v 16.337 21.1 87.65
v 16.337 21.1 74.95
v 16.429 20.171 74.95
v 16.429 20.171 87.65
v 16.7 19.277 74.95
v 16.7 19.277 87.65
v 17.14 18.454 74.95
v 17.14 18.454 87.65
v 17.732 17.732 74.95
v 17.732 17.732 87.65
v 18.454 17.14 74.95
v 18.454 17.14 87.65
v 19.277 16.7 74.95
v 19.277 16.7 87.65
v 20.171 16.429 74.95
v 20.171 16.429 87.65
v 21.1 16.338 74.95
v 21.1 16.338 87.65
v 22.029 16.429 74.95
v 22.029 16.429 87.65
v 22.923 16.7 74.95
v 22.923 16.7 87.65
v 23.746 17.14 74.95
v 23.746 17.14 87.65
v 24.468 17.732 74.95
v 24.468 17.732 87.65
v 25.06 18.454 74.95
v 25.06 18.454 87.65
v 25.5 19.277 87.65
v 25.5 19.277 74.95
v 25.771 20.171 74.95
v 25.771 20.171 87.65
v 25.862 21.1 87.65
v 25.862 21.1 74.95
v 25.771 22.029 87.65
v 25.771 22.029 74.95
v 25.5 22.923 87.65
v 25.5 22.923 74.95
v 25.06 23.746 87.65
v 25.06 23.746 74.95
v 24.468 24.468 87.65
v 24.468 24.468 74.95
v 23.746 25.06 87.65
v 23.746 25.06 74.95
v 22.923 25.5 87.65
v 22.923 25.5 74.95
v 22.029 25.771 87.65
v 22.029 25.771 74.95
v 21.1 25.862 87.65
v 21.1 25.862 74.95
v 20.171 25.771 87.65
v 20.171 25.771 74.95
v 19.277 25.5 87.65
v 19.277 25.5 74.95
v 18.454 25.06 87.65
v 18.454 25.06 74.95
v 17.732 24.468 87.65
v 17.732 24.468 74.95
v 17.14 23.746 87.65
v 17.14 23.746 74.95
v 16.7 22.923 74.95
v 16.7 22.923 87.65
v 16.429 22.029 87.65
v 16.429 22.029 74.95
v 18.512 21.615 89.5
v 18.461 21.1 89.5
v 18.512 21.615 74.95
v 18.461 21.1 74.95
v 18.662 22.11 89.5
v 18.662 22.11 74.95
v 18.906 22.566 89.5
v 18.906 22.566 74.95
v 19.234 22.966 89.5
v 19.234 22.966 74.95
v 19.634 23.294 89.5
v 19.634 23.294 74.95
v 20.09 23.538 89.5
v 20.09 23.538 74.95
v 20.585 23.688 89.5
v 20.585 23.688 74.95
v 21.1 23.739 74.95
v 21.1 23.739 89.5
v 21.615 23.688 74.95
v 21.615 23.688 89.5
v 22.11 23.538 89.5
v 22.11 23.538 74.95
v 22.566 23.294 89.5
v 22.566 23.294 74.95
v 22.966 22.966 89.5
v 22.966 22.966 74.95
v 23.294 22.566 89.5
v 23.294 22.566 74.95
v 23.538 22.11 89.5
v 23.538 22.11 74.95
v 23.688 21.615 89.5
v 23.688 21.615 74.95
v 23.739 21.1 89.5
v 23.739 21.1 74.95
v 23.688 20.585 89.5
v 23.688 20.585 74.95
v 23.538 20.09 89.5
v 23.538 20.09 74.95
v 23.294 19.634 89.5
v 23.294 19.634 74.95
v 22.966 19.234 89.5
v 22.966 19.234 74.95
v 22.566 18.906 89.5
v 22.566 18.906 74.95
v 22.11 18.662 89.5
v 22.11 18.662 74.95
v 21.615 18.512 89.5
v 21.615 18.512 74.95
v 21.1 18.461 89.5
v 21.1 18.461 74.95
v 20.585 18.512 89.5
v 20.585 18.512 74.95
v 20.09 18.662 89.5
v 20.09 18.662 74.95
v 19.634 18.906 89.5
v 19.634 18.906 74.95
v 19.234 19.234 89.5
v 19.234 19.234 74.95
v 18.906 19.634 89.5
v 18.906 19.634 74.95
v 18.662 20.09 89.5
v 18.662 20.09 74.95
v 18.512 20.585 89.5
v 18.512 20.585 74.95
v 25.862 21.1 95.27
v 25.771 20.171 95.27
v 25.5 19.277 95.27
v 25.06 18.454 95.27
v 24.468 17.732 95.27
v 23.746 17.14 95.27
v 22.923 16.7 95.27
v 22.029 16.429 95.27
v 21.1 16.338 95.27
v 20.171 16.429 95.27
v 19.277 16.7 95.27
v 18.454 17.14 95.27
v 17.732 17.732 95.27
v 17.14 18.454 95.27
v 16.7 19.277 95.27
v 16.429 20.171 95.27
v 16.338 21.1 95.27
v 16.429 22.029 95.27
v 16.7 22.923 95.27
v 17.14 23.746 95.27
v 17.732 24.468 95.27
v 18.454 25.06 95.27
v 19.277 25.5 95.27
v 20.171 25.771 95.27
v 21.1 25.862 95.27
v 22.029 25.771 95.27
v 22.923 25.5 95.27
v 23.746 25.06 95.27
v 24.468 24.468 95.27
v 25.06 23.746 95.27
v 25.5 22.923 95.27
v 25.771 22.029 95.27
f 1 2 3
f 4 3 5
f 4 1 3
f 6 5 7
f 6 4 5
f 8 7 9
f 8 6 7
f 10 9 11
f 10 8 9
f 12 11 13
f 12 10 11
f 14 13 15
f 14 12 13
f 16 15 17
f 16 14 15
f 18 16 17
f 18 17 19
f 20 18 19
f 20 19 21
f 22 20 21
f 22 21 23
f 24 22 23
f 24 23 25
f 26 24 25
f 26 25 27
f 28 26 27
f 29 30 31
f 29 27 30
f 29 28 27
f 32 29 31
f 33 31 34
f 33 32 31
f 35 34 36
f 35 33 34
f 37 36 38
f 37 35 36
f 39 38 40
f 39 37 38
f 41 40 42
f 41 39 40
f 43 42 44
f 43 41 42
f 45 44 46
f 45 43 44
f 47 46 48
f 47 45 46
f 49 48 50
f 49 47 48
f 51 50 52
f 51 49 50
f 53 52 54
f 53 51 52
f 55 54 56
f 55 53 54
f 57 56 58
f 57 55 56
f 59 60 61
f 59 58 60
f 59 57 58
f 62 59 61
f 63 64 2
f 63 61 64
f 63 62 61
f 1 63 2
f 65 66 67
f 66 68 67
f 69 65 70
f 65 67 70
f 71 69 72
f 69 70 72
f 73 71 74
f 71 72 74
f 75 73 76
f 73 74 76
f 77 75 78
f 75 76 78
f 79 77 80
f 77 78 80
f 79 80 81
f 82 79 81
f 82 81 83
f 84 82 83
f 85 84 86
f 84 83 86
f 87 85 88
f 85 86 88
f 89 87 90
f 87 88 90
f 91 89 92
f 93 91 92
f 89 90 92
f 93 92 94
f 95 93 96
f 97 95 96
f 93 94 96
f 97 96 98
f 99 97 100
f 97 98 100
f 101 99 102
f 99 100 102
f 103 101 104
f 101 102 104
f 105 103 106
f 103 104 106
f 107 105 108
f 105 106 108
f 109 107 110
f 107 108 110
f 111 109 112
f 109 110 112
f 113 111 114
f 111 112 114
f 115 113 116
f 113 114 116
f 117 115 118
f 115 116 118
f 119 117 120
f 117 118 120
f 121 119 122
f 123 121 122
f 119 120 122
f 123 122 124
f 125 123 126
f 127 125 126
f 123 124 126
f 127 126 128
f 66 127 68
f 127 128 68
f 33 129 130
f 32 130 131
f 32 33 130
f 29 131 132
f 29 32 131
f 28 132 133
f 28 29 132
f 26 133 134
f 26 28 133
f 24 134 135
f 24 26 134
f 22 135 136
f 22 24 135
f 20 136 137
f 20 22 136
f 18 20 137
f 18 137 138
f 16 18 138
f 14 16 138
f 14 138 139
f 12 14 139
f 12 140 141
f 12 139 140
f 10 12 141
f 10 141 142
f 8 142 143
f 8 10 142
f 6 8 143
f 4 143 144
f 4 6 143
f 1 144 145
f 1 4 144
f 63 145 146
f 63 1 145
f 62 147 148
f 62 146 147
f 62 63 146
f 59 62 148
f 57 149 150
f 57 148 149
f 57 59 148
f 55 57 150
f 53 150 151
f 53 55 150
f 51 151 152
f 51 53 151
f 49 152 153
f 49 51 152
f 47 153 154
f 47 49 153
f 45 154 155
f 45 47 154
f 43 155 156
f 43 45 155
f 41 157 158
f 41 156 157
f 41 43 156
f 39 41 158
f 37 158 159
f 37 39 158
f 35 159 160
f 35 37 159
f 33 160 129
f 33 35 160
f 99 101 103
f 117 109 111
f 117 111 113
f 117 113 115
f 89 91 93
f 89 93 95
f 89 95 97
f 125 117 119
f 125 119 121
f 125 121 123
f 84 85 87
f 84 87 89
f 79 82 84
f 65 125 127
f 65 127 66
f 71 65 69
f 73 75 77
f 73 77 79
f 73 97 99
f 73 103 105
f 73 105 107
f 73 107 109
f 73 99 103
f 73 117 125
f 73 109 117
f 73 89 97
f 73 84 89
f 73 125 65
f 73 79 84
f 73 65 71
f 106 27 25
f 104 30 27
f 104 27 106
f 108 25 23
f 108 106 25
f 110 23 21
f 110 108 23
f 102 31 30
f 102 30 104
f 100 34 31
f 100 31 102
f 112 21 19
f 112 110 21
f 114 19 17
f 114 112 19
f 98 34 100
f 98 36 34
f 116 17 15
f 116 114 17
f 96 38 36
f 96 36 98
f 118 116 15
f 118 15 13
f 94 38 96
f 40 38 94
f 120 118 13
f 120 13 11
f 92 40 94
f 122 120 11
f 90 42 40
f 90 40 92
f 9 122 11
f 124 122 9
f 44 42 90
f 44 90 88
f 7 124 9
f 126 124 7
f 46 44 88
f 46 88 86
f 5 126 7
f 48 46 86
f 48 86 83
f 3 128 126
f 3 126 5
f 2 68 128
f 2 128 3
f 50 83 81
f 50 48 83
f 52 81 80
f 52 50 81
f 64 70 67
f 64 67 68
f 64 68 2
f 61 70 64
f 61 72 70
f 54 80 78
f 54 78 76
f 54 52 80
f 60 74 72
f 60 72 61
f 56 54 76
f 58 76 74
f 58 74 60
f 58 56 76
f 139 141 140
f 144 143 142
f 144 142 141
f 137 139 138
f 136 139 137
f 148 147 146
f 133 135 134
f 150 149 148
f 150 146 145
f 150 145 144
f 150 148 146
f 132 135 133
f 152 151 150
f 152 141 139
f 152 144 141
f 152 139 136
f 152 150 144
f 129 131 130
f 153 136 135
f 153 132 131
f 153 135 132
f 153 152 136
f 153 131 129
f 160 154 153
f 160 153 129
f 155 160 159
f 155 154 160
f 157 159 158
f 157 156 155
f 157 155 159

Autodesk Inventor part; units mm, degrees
ref_plane "YZ Plane" through (0, 0, 0) normal (1, 0, 0) x (0, 1, 0)
ref_plane "XZ Plane" through (0, 0, 0) normal (0, 1, 0) x (-1, 0, 0)
ref_plane "XY Plane" through (0, 0, 0) normal (0, 0, 1) x (1, 0, 0)
sketch "Sketch1" plane through (0, 0, 0) normal (0, 0, 1) x (1, 0, 0)
  line L0 (0, 37.2) -> (5, 42.2)
  line L1 (37.2, 42.2) -> (42.2, 37.2)
  line L2 (42.2, 5) -> (37.2, 0)
  line L3 (5, 0) -> (0, 5)
  line L4 (0, 37.2) -> (0, 5)
  line L5 (37.2, 42.2) -> (5, 42.2)
  line L6 (42.2, 5) -> (42.2, 37.2)
  line L7 (5, 0) -> (37.2, 0)
  line L8 (0, 5) -> (0, 0)
  circle A0 centre (21.1, 21.1) radius 2.5
  circle A1 centre (5.6, 36.6) radius 1.5
  circle A2 centre (36.6, 36.6) radius 1.5
  circle A3 centre (36.6, 5.6) radius 1.5
  circle A4 centre (5.6, 5.6) radius 1.5
  dimension "d8" = 5
  dimension "d9" = 5
  dimension "d10" = 5
  dimension "d11" = 21.1
  dimension "d12" = 21.1
  dimension "d13" = 3
  dimension "d14" = 3
  dimension "d15" = 3
  dimension "d16" = 3
  dimension "d17" = 31
  dimension "d18" = 31
  dimension "d19" = 31
  dimension "d20" = 31
  dimension "d21" = 5.6
  dimension "d22" = 5.6
  dimension "d43" = 5.6
  dimension "d44" = 5.6
  dimension "d45" = 5.6
  dimension "d46" = 5.6
  dimension "d47" = 42.2
extrude "Extrusion1" add sketch "Sketch1" along normal blind 9.8
sketch "Sketch2" plane through (0, 0, 9.8) normal (0, 0, 1) x (1, 0, 0)
  circle A0 centre (21.1, 21.1) radius 2.5 projected
  circle A1 centre (5.6, 5.6) radius 1.5 projected
  circle A2 centre (36.6, 5.6) radius 1.5 projected
  circle A3 centre (36.6, 36.6) radius 1.5 projected
  circle A4 centre (5.6, 36.6) radius 1.5 projected
  line L0 (5, 42.2) -> (0, 37.2) projected
  line L1 (0, 37.2) -> (0, 5) projected
  line L2 (0, 5) -> (5, 0) projected
  line L3 (5, 0) -> (37.2, 0) projected
  line L4 (37.2, 0) -> (42.2, 5) projected
  line L5 (42.2, 5) -> (42.2, 37.2) projected
  line L6 (42.2, 37.2) -> (37.2, 42.2) projected
  line L7 (37.2, 42.2) -> (5, 42.2) projected
  point P0 (0, 0)
fillet "Fillet1" radius 0.25 8 edges at (21.1, 42.2, 9.8) (39.7, 39.7, 9.8) (42.2, 21.1, 9.8) (39.7, 2.5, 9.8) (21.1, 0, 9.8) (2.5, 2.5, 9.8) (0, 21.1, 9.8) (2.5, 39.7, 9.8)
extrude "Extrusion2" add sketch "Sketch2" along normal blind 31
sketch "Sketch3" plane through (0, 0, 40.8) normal (0, 0, 1) x (1, 0, 0)
  circle A0 centre (21.1, 21.1) radius 2.5 projected
  circle A1 centre (5.6, 36.6) radius 1.5 projected
  circle A2 centre (36.6, 36.6) radius 1.5 projected
  circle A3 centre (36.6, 5.6) radius 1.5 projected
  circle A4 centre (5.6, 5.6) radius 1.5 projected
  line L0 (5, 42.2) -> (0, 37.2) projected
  line L1 (0, 37.2) -> (0, 5) projected
  line L2 (0, 5) -> (5, 0) projected
  line L3 (5, 0) -> (37.2, 0) projected
  line L4 (37.2, 0) -> (42.2, 5) projected
  line L5 (42.2, 5) -> (42.2, 37.2) projected
  line L6 (42.2, 37.2) -> (37.2, 42.2) projected
  line L7 (37.2, 42.2) -> (5, 42.2) projected
  point P0 (0, 0)
fillet "Fillet2" radius 0.25 8 edges at (21.1, 42.2, 40.8) (39.7, 39.7, 40.8) (42.2, 21.1, 40.8) (39.7, 2.5, 40.8) (21.1, 0, 40.8) (2.5, 2.5, 40.8) (0, 21.1, 40.8) (2.5, 39.7, 40.8)
extrude "Extrusion3" add sketch "Sketch3" along normal blind 7.75
sketch "Sketch4" plane through (0, 0, 48.55) normal (0, 0, 1) x (1, 0, 0)
  circle A0 centre (21.1, 21.1) radius 2.5 projected
  circle A1 centre (21.1, 21.1) radius 16
  point P0 (0, 0)
  dimension "d31" = 32
extrude "Extrusion4" cut sketch "Sketch4" against normal blind 0.6
sketch "Sketch5" plane through (21.1, 21.1, 47.95) normal (0, 0, 1) x (1, 0, 0)
  circle A0 centre (0, 0) radius 2.5 projected
  circle A1 centre (0, 0) radius 16 projected
  circle A2 centre (0, 0) radius 11
  point P0 (-21.1, -21.1)
  dimension "d35" = 22
extrude "Extrusion5" add sketch "Sketch5" along normal blind 2.2 contours A2
fillet "Fillet3" radius 0.5 1 edges at (10.1, 21.1, 50.15)
sketch "Sketch6" plane through (21.1, 21.1, 50.15) normal (0, 0, 1) x (1, 0, 0)
  circle A0 centre (0, 0) radius 2.5 projected
  point P0 (-21.1, -21.1)
extrude "Extrusion6" add sketch "Sketch6" along normal blind 22.5
fillet "Fillet4" radius 0.5 1 edges at (18.6, 21.1, 72.65)
sketch "Sketch7" plane through (21.1, 21.1, 72.65) normal (0, 0, 1) x (1, 0, 0)
  circle A0 centre (0, 0) radius 2.6386
  point P0 (-21.1, -21.1)
extrude "Extrusion7" add sketch "Sketch7" along normal blind 15
sketch "Sketch8" plane through (21.1, 21.1, 87.65) normal (0, 0, 1) x (1, 0, 0)
  circle A0 centre (0, 0) radius 2 projected
  circle A1 centre (0, 0) radius 4.7625
  point P0 (-21.1, -21.1)
  dimension "d50" = 9.525
extrude "Extrusion8" add sketch "Sketch8" along normal blind 12.7 contours A0 | A1
sketch "Sketch9" plane through (21.1, 21.1, 87.65) normal (0, 0, -1) x (-1, 0, 0)
  circle A0 centre (0, 0) radius 4.7625 projected
  circle A1 centre (0, 0) radius 2.6386 projected
  point P0 (21.1, -21.1)
extrude "Extrusion9" add sketch "Sketch9" along normal blind 12.7
sketch "Sketch10" plane through (0, 0, 0) normal (0, 0, -1) x (-1, 0, 0)
  circle A0 centre (-21.1, 21.1) radius 2.5 projected
  circle A1 centre (-5.6, 5.6) radius 1.5 projected
  circle A2 centre (-36.6, 5.6) radius 1.5 projected
  circle A3 centre (-36.6, 36.6) radius 1.5 projected
  circle A4 centre (-5.6, 36.6) radius 1.5 projected
  line L0 (0, 37.2) -> (-5, 42.2) projected
  line L1 (-5, 42.2) -> (-37.2, 42.2) projected
  line L2 (-37.2, 42.2) -> (-42.2, 37.2) projected
  line L3 (-42.2, 37.2) -> (-42.2, 5) projected
  line L4 (-42.2, 5) -> (-37.2, 0) projected
  line L5 (-37.2, 0) -> (-5, 0) projected
  line L6 (-5, 0) -> (0, 5) projected
  line L7 (0, 5) -> (0, 37.2) projected
  circle A5 centre (-21.1, 21.1) radius 2 projected
  circle A6 centre (-21.1, 21.1) radius 2.5 projected
  circle A7 centre (-21.1, 21.1) radius 2.5 projected
  point P0 (0, 0)
extrude "Extrusion10" cut sketch "Sketch10" against normal blind 72.8 contours A0 | A1 | A2 | A3 | A4 | L7 L6 L5 L4 L3 L2 L1 L0 | A5
sketch "Sketch12" plane through (21.1, 21.1, 72.8) normal (0, 0, -1) x (-1, 0, 0)
  circle A0 centre (0, 0) radius 2.6386 projected
  point P0 (21.1, -21.1)
extrude "Extrusion11" cut sketch "Sketch12" against normal blind 16.7
sketch "Sketch13" plane through (21.1, 21.1, 100.35) normal (0, 0, 1) x (1, 0, 0)
  circle A0 centre (0, 0) radius 4.7625 projected
  point P0 (-21.1, -21.1)
extrude "Extrusion12" cut sketch "Sketch13" against normal blind 5.08
properties part number "Nema 17 adapter"
